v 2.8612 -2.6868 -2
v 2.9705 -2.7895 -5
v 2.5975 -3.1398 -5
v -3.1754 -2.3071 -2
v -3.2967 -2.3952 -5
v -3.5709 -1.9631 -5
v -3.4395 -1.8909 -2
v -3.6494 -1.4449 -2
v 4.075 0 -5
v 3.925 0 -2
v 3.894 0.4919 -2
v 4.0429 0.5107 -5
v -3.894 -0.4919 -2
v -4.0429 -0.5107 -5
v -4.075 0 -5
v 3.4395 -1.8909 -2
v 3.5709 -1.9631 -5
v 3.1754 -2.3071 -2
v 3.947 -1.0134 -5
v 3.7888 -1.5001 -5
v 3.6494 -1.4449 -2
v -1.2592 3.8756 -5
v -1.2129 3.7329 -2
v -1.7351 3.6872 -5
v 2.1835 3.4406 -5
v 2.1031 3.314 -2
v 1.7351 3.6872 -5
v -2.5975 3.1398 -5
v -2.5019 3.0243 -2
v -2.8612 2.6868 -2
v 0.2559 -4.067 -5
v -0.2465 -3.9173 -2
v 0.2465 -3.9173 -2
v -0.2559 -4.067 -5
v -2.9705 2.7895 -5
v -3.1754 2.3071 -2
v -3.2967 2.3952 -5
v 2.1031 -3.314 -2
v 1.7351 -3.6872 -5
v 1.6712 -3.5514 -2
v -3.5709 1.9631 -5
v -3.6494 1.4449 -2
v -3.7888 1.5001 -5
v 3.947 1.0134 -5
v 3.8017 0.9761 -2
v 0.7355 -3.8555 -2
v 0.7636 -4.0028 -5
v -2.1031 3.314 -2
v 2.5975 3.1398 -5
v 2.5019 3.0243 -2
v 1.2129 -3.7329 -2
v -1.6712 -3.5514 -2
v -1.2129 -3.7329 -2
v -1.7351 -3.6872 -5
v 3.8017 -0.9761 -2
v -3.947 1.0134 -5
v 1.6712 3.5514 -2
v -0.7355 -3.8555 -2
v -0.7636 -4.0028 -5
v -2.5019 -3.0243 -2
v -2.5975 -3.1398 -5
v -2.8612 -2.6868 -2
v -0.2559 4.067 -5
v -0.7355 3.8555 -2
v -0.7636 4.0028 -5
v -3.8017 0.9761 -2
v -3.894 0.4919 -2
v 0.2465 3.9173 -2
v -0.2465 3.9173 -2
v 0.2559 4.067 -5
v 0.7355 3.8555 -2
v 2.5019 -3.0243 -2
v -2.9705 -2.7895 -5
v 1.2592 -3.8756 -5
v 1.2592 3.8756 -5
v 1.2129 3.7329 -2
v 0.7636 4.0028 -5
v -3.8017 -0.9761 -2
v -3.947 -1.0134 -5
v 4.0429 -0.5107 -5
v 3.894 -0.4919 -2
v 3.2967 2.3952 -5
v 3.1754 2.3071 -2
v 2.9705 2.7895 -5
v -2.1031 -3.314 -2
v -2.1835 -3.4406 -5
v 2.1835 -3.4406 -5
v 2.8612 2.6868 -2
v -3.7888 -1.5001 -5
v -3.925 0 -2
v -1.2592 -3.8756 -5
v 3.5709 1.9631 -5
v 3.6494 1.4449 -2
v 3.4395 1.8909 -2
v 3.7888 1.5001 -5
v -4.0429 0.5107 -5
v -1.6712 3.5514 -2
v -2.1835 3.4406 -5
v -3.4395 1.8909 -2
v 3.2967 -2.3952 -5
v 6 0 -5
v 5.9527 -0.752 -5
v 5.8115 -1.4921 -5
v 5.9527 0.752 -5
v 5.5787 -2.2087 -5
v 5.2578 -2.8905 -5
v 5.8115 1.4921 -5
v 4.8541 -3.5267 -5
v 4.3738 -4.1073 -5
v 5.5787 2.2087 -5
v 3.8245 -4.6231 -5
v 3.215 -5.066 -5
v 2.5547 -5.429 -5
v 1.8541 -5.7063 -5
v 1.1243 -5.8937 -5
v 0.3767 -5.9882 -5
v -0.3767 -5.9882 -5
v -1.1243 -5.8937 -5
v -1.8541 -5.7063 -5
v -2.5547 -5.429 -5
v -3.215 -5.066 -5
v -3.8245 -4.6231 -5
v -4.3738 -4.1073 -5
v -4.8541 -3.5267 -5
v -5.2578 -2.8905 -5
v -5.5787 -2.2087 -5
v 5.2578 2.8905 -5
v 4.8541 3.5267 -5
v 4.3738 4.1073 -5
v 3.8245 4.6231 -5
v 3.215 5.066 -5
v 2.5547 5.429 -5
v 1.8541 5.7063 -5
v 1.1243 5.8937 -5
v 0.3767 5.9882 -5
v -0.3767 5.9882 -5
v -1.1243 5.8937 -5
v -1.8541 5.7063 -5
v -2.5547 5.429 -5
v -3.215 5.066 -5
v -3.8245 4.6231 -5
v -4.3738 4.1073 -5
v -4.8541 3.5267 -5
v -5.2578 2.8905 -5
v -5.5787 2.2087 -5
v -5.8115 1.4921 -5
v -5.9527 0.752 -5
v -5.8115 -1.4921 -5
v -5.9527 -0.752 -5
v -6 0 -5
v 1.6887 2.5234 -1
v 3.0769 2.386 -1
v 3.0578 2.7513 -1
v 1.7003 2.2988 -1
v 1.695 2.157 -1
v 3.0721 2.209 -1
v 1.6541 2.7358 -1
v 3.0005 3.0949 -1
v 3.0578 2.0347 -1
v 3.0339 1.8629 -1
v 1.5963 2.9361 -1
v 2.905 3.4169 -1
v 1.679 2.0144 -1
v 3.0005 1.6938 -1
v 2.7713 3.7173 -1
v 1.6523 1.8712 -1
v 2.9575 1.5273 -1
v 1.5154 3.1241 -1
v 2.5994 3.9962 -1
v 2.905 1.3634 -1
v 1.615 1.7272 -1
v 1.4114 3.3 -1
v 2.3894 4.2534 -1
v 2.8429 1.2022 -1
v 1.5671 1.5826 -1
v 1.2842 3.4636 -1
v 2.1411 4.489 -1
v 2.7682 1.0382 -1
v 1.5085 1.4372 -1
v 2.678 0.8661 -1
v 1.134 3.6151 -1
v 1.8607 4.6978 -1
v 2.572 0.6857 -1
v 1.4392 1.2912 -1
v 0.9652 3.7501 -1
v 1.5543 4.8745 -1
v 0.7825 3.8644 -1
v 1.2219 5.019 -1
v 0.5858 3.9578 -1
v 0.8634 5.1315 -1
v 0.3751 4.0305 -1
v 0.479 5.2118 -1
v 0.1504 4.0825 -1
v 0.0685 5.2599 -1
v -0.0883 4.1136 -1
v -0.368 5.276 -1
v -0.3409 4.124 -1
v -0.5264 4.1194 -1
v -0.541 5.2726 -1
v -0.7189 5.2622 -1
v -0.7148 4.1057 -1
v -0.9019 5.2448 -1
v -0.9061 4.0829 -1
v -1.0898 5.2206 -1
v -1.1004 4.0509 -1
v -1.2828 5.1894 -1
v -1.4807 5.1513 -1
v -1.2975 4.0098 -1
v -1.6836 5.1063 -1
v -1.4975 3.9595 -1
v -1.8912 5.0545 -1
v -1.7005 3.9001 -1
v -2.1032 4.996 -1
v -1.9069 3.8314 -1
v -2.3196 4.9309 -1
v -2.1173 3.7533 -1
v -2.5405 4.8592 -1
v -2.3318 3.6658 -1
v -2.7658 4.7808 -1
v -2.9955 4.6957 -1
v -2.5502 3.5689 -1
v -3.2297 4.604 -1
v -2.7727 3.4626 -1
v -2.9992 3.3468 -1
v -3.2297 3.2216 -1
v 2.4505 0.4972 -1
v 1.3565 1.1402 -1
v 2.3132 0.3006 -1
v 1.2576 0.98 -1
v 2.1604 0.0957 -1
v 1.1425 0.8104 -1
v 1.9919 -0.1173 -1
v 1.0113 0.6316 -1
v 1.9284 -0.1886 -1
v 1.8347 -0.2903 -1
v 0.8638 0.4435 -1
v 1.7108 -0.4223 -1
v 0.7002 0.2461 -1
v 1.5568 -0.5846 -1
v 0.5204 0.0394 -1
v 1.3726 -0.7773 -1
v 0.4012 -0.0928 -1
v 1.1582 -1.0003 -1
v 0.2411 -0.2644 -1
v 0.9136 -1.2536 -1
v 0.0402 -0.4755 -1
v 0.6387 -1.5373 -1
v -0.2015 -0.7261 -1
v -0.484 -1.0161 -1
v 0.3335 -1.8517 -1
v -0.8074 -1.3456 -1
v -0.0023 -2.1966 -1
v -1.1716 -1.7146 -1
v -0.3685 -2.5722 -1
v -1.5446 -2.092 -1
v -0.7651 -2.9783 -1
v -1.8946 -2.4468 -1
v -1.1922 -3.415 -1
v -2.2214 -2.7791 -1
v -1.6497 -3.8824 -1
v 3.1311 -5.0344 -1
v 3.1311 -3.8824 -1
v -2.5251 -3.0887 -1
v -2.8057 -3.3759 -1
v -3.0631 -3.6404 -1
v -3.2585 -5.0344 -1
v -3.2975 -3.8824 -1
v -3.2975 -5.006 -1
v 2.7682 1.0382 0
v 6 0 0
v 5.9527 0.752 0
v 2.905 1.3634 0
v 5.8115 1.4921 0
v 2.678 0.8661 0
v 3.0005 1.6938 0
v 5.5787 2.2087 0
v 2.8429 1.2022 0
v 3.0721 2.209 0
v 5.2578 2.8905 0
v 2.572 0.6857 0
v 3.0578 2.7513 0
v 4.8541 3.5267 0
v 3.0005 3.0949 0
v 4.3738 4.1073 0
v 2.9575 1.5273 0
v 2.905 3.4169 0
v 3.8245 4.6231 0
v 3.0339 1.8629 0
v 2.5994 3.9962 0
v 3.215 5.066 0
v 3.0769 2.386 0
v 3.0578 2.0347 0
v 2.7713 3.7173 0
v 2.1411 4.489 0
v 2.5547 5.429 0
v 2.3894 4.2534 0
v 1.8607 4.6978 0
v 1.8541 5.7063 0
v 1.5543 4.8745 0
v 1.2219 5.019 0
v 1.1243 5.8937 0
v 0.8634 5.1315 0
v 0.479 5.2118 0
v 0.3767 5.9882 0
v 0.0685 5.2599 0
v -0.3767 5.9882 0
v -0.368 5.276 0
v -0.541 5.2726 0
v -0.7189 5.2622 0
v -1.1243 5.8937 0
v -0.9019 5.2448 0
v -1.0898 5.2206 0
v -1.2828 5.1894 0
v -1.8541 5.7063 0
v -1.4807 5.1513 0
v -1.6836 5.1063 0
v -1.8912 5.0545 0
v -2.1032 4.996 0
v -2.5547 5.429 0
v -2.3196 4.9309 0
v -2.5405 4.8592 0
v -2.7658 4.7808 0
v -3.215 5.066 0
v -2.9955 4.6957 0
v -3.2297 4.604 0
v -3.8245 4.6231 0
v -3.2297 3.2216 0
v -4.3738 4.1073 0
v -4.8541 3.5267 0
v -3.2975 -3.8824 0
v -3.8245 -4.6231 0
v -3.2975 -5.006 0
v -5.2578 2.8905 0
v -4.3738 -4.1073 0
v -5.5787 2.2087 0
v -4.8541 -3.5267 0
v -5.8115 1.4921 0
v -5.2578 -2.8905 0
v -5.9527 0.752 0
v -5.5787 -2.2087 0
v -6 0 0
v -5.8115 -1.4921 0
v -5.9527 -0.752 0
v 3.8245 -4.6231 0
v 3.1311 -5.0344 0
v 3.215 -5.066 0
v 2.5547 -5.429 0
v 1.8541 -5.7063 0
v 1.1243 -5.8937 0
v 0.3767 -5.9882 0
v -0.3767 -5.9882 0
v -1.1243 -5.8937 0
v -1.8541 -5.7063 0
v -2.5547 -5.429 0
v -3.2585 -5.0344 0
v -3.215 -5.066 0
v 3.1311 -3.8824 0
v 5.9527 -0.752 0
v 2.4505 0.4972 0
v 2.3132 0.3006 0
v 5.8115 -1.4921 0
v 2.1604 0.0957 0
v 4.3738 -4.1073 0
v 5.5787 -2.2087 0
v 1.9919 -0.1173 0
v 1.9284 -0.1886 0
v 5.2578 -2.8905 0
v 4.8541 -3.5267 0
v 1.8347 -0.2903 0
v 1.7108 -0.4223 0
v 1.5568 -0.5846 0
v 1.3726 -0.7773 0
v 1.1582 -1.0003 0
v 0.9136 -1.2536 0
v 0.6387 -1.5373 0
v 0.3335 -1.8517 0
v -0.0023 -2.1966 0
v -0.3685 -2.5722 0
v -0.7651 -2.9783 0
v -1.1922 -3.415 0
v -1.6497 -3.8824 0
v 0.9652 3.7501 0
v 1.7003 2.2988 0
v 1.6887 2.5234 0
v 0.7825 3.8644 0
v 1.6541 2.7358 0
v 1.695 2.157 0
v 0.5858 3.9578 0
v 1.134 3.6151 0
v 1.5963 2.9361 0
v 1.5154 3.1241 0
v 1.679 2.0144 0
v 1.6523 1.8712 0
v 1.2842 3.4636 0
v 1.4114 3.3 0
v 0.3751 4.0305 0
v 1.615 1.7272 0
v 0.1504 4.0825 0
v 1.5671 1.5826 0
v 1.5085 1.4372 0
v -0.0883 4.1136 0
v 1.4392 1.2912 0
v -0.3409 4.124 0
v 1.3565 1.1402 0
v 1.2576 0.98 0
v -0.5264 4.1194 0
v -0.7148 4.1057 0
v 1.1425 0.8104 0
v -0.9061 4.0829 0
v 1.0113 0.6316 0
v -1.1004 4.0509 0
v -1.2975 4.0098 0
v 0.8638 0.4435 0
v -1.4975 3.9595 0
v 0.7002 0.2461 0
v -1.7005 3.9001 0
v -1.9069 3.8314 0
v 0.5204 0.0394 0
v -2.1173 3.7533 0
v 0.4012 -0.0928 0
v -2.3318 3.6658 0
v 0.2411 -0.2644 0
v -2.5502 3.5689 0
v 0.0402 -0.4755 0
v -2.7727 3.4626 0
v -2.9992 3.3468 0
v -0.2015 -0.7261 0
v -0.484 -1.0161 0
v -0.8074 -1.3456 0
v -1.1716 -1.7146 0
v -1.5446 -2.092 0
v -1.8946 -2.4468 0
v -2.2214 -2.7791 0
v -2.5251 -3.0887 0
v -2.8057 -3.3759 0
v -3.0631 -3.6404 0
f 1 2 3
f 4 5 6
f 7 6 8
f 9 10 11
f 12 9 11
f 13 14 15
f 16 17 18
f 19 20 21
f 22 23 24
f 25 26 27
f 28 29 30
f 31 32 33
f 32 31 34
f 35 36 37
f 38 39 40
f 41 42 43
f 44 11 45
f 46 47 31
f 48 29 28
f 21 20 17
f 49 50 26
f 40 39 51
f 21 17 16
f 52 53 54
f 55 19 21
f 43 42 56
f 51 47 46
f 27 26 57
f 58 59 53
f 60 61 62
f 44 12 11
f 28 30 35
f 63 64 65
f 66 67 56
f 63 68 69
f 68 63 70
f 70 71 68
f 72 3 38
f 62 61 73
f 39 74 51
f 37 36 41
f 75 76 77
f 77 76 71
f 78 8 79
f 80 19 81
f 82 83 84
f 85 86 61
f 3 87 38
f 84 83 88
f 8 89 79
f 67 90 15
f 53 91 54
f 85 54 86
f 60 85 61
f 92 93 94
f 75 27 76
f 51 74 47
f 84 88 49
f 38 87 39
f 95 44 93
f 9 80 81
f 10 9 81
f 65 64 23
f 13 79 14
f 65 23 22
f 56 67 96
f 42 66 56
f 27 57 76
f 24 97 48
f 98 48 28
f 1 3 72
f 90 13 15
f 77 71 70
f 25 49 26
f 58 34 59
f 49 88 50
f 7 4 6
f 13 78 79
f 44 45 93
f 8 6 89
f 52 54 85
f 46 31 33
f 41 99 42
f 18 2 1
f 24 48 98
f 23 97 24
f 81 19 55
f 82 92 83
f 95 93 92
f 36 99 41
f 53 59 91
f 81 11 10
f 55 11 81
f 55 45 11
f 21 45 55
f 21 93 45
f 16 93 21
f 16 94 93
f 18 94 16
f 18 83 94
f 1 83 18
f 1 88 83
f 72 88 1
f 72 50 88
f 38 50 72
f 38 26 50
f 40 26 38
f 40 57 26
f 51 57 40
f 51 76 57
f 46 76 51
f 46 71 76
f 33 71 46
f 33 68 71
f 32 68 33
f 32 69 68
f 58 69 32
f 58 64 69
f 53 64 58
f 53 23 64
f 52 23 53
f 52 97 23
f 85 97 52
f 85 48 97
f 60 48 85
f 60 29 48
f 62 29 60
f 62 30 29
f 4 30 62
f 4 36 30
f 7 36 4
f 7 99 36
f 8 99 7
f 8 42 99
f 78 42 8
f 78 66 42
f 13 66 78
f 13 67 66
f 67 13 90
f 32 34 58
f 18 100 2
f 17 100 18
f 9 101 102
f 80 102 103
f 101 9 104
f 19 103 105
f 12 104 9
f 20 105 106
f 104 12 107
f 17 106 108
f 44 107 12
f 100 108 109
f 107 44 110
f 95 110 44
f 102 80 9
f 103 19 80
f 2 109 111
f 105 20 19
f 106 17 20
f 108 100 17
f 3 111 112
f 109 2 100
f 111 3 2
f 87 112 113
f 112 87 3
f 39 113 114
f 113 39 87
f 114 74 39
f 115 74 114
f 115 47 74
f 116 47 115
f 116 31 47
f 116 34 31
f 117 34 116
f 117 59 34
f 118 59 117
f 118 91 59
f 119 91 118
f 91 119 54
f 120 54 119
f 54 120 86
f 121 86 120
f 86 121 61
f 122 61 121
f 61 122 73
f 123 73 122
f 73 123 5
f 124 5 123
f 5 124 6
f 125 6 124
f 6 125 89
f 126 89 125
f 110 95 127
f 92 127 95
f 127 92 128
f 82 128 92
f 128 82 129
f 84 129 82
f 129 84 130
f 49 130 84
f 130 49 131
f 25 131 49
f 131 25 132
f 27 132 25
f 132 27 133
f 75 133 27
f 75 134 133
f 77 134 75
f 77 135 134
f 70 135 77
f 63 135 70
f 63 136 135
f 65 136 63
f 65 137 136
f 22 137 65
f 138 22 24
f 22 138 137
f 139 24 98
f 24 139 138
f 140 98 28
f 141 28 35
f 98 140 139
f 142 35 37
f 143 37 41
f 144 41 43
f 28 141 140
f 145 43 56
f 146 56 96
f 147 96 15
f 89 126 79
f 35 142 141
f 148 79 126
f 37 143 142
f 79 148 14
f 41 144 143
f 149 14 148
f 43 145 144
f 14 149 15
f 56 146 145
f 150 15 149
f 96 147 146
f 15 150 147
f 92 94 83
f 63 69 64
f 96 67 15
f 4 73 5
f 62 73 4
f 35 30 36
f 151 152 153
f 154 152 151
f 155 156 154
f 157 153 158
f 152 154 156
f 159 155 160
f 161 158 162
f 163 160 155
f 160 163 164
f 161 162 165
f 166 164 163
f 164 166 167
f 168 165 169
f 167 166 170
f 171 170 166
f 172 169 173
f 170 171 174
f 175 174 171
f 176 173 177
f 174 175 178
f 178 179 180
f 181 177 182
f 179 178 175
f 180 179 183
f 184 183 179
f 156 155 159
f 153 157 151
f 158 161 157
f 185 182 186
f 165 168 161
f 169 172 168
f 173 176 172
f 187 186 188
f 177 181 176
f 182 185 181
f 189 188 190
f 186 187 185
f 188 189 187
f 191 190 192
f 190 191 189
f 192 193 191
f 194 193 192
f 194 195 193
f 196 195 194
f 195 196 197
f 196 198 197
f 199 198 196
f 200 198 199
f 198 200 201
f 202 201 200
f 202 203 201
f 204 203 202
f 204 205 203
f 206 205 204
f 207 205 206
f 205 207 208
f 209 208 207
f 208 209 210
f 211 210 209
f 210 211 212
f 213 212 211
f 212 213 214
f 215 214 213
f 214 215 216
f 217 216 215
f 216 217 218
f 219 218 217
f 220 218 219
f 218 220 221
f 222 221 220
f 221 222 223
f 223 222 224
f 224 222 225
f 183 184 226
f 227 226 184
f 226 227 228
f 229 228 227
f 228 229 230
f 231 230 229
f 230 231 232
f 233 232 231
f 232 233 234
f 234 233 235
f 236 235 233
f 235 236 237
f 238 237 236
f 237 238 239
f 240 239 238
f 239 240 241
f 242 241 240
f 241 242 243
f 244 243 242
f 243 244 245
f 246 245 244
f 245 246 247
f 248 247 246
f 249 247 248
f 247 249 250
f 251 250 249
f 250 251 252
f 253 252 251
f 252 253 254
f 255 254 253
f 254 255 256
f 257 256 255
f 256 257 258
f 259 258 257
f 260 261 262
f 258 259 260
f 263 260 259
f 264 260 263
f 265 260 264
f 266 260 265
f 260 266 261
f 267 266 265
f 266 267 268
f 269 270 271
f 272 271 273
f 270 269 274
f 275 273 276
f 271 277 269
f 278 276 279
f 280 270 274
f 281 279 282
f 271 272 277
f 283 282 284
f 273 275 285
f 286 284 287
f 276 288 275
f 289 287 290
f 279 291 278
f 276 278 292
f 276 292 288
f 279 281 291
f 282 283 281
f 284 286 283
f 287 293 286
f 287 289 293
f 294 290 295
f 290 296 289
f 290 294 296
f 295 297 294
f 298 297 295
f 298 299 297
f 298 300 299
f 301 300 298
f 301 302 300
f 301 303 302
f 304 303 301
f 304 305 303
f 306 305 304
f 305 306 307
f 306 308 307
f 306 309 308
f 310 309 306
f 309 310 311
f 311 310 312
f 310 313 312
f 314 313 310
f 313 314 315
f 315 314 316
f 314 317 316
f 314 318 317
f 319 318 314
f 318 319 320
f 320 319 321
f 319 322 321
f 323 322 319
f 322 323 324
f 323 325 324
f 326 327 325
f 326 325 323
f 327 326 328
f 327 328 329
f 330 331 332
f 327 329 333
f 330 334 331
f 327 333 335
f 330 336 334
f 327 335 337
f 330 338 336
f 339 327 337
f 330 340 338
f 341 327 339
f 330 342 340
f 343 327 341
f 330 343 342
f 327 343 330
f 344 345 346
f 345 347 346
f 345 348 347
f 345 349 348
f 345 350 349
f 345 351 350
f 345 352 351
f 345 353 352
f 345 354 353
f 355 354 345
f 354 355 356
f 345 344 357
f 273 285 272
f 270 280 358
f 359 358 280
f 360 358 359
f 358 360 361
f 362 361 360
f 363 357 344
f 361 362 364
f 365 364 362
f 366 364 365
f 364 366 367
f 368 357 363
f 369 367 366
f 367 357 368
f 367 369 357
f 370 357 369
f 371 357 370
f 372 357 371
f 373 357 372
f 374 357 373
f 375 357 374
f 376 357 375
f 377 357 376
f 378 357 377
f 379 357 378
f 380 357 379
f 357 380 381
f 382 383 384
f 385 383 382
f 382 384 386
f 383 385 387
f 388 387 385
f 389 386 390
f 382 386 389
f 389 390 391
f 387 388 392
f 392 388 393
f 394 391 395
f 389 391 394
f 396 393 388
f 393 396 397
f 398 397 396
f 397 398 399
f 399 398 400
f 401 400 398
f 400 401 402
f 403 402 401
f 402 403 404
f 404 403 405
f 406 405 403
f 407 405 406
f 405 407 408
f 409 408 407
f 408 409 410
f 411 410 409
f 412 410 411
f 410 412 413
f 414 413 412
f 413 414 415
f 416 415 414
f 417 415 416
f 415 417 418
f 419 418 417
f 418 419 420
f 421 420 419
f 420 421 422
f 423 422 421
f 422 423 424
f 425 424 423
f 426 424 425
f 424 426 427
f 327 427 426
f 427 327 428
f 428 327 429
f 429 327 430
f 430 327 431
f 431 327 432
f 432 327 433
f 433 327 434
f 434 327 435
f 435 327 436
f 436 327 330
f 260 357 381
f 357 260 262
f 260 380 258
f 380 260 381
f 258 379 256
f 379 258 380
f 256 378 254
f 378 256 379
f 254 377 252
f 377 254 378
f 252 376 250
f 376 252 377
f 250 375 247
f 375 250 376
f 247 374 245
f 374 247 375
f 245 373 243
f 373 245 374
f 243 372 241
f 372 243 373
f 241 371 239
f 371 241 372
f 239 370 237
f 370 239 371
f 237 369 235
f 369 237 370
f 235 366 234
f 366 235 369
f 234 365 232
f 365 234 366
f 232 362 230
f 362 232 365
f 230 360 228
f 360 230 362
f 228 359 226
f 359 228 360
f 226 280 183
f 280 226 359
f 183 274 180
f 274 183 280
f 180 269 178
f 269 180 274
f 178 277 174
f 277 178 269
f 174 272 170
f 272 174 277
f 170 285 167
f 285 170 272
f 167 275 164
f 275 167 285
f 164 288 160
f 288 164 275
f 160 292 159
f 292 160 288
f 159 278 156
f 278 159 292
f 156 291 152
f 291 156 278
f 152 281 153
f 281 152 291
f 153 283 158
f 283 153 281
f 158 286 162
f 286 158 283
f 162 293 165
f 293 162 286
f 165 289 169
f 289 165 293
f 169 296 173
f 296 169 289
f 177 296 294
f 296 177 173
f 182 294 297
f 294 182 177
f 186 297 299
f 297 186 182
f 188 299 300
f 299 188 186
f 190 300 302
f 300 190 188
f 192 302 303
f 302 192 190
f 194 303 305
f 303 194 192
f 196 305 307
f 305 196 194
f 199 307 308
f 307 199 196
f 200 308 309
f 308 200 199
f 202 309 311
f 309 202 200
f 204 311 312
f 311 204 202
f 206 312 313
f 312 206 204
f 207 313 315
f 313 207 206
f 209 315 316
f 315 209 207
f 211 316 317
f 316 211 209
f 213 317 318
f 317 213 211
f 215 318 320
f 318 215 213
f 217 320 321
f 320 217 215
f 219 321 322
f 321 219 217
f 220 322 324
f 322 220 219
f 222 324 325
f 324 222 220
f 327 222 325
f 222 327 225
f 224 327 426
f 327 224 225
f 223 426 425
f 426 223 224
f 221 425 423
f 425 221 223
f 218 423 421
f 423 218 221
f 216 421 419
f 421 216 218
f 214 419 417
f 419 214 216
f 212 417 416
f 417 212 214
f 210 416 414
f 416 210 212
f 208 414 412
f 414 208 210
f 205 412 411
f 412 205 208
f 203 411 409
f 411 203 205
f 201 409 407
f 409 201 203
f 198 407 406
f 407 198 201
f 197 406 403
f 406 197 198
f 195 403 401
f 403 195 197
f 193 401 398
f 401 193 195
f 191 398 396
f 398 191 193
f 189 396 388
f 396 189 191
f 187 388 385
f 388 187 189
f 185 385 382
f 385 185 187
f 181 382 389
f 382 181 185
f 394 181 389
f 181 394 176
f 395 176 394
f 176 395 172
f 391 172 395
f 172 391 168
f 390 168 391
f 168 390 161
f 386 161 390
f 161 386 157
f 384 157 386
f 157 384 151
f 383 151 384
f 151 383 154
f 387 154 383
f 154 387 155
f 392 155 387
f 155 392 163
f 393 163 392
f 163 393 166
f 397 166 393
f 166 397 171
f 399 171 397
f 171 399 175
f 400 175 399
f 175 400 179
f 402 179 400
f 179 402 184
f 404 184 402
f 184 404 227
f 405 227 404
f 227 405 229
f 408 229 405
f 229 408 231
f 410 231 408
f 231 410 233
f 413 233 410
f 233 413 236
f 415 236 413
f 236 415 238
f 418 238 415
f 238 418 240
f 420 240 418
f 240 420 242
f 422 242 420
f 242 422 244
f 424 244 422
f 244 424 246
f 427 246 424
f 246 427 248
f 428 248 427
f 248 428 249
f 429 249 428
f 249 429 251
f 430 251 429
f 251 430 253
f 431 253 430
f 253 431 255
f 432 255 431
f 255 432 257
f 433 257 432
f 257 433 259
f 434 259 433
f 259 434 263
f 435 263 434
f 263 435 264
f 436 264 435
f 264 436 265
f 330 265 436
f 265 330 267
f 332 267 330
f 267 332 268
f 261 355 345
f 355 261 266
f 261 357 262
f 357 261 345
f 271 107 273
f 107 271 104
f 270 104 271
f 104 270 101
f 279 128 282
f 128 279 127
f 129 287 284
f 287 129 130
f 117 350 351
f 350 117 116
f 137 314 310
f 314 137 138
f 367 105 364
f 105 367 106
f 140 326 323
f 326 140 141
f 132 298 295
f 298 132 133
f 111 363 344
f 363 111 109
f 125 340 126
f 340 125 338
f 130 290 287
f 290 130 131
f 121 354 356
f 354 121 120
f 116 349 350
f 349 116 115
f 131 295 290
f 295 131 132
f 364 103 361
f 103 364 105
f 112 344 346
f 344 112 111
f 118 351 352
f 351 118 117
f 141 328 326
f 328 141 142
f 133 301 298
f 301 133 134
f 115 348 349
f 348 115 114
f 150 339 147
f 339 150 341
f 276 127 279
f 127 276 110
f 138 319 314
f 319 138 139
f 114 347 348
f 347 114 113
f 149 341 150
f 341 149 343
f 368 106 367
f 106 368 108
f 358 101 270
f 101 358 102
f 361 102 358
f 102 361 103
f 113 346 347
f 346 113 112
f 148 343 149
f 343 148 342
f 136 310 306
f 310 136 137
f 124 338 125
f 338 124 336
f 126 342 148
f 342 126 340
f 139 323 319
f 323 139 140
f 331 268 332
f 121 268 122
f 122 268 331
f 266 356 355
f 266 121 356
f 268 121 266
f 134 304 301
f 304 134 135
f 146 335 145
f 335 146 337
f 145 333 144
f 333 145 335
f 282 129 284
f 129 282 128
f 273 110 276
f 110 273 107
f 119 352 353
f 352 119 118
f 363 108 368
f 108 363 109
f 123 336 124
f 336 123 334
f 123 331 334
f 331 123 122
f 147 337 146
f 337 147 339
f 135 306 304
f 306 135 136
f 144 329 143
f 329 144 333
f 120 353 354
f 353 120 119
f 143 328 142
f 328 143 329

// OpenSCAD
$fn = 50;

difference() {
	union() {
		translate(v = [0, 0, -5.0]) {
			cylinder(h = 5, r = 6.0);
		}
	}
	union() {
		#translate(v = [0, 0, -5.0]) {
			cylinder(h = 3, r1 = 4.075, r2 = 3.925);
		}
		translate(v = [0, 0, -1]) {
			linear_extrude(height = 1) {
				text(font = "Impact", halign = "center", size = 10, text = "2", valign = "center");
			}
		}
	}
}
